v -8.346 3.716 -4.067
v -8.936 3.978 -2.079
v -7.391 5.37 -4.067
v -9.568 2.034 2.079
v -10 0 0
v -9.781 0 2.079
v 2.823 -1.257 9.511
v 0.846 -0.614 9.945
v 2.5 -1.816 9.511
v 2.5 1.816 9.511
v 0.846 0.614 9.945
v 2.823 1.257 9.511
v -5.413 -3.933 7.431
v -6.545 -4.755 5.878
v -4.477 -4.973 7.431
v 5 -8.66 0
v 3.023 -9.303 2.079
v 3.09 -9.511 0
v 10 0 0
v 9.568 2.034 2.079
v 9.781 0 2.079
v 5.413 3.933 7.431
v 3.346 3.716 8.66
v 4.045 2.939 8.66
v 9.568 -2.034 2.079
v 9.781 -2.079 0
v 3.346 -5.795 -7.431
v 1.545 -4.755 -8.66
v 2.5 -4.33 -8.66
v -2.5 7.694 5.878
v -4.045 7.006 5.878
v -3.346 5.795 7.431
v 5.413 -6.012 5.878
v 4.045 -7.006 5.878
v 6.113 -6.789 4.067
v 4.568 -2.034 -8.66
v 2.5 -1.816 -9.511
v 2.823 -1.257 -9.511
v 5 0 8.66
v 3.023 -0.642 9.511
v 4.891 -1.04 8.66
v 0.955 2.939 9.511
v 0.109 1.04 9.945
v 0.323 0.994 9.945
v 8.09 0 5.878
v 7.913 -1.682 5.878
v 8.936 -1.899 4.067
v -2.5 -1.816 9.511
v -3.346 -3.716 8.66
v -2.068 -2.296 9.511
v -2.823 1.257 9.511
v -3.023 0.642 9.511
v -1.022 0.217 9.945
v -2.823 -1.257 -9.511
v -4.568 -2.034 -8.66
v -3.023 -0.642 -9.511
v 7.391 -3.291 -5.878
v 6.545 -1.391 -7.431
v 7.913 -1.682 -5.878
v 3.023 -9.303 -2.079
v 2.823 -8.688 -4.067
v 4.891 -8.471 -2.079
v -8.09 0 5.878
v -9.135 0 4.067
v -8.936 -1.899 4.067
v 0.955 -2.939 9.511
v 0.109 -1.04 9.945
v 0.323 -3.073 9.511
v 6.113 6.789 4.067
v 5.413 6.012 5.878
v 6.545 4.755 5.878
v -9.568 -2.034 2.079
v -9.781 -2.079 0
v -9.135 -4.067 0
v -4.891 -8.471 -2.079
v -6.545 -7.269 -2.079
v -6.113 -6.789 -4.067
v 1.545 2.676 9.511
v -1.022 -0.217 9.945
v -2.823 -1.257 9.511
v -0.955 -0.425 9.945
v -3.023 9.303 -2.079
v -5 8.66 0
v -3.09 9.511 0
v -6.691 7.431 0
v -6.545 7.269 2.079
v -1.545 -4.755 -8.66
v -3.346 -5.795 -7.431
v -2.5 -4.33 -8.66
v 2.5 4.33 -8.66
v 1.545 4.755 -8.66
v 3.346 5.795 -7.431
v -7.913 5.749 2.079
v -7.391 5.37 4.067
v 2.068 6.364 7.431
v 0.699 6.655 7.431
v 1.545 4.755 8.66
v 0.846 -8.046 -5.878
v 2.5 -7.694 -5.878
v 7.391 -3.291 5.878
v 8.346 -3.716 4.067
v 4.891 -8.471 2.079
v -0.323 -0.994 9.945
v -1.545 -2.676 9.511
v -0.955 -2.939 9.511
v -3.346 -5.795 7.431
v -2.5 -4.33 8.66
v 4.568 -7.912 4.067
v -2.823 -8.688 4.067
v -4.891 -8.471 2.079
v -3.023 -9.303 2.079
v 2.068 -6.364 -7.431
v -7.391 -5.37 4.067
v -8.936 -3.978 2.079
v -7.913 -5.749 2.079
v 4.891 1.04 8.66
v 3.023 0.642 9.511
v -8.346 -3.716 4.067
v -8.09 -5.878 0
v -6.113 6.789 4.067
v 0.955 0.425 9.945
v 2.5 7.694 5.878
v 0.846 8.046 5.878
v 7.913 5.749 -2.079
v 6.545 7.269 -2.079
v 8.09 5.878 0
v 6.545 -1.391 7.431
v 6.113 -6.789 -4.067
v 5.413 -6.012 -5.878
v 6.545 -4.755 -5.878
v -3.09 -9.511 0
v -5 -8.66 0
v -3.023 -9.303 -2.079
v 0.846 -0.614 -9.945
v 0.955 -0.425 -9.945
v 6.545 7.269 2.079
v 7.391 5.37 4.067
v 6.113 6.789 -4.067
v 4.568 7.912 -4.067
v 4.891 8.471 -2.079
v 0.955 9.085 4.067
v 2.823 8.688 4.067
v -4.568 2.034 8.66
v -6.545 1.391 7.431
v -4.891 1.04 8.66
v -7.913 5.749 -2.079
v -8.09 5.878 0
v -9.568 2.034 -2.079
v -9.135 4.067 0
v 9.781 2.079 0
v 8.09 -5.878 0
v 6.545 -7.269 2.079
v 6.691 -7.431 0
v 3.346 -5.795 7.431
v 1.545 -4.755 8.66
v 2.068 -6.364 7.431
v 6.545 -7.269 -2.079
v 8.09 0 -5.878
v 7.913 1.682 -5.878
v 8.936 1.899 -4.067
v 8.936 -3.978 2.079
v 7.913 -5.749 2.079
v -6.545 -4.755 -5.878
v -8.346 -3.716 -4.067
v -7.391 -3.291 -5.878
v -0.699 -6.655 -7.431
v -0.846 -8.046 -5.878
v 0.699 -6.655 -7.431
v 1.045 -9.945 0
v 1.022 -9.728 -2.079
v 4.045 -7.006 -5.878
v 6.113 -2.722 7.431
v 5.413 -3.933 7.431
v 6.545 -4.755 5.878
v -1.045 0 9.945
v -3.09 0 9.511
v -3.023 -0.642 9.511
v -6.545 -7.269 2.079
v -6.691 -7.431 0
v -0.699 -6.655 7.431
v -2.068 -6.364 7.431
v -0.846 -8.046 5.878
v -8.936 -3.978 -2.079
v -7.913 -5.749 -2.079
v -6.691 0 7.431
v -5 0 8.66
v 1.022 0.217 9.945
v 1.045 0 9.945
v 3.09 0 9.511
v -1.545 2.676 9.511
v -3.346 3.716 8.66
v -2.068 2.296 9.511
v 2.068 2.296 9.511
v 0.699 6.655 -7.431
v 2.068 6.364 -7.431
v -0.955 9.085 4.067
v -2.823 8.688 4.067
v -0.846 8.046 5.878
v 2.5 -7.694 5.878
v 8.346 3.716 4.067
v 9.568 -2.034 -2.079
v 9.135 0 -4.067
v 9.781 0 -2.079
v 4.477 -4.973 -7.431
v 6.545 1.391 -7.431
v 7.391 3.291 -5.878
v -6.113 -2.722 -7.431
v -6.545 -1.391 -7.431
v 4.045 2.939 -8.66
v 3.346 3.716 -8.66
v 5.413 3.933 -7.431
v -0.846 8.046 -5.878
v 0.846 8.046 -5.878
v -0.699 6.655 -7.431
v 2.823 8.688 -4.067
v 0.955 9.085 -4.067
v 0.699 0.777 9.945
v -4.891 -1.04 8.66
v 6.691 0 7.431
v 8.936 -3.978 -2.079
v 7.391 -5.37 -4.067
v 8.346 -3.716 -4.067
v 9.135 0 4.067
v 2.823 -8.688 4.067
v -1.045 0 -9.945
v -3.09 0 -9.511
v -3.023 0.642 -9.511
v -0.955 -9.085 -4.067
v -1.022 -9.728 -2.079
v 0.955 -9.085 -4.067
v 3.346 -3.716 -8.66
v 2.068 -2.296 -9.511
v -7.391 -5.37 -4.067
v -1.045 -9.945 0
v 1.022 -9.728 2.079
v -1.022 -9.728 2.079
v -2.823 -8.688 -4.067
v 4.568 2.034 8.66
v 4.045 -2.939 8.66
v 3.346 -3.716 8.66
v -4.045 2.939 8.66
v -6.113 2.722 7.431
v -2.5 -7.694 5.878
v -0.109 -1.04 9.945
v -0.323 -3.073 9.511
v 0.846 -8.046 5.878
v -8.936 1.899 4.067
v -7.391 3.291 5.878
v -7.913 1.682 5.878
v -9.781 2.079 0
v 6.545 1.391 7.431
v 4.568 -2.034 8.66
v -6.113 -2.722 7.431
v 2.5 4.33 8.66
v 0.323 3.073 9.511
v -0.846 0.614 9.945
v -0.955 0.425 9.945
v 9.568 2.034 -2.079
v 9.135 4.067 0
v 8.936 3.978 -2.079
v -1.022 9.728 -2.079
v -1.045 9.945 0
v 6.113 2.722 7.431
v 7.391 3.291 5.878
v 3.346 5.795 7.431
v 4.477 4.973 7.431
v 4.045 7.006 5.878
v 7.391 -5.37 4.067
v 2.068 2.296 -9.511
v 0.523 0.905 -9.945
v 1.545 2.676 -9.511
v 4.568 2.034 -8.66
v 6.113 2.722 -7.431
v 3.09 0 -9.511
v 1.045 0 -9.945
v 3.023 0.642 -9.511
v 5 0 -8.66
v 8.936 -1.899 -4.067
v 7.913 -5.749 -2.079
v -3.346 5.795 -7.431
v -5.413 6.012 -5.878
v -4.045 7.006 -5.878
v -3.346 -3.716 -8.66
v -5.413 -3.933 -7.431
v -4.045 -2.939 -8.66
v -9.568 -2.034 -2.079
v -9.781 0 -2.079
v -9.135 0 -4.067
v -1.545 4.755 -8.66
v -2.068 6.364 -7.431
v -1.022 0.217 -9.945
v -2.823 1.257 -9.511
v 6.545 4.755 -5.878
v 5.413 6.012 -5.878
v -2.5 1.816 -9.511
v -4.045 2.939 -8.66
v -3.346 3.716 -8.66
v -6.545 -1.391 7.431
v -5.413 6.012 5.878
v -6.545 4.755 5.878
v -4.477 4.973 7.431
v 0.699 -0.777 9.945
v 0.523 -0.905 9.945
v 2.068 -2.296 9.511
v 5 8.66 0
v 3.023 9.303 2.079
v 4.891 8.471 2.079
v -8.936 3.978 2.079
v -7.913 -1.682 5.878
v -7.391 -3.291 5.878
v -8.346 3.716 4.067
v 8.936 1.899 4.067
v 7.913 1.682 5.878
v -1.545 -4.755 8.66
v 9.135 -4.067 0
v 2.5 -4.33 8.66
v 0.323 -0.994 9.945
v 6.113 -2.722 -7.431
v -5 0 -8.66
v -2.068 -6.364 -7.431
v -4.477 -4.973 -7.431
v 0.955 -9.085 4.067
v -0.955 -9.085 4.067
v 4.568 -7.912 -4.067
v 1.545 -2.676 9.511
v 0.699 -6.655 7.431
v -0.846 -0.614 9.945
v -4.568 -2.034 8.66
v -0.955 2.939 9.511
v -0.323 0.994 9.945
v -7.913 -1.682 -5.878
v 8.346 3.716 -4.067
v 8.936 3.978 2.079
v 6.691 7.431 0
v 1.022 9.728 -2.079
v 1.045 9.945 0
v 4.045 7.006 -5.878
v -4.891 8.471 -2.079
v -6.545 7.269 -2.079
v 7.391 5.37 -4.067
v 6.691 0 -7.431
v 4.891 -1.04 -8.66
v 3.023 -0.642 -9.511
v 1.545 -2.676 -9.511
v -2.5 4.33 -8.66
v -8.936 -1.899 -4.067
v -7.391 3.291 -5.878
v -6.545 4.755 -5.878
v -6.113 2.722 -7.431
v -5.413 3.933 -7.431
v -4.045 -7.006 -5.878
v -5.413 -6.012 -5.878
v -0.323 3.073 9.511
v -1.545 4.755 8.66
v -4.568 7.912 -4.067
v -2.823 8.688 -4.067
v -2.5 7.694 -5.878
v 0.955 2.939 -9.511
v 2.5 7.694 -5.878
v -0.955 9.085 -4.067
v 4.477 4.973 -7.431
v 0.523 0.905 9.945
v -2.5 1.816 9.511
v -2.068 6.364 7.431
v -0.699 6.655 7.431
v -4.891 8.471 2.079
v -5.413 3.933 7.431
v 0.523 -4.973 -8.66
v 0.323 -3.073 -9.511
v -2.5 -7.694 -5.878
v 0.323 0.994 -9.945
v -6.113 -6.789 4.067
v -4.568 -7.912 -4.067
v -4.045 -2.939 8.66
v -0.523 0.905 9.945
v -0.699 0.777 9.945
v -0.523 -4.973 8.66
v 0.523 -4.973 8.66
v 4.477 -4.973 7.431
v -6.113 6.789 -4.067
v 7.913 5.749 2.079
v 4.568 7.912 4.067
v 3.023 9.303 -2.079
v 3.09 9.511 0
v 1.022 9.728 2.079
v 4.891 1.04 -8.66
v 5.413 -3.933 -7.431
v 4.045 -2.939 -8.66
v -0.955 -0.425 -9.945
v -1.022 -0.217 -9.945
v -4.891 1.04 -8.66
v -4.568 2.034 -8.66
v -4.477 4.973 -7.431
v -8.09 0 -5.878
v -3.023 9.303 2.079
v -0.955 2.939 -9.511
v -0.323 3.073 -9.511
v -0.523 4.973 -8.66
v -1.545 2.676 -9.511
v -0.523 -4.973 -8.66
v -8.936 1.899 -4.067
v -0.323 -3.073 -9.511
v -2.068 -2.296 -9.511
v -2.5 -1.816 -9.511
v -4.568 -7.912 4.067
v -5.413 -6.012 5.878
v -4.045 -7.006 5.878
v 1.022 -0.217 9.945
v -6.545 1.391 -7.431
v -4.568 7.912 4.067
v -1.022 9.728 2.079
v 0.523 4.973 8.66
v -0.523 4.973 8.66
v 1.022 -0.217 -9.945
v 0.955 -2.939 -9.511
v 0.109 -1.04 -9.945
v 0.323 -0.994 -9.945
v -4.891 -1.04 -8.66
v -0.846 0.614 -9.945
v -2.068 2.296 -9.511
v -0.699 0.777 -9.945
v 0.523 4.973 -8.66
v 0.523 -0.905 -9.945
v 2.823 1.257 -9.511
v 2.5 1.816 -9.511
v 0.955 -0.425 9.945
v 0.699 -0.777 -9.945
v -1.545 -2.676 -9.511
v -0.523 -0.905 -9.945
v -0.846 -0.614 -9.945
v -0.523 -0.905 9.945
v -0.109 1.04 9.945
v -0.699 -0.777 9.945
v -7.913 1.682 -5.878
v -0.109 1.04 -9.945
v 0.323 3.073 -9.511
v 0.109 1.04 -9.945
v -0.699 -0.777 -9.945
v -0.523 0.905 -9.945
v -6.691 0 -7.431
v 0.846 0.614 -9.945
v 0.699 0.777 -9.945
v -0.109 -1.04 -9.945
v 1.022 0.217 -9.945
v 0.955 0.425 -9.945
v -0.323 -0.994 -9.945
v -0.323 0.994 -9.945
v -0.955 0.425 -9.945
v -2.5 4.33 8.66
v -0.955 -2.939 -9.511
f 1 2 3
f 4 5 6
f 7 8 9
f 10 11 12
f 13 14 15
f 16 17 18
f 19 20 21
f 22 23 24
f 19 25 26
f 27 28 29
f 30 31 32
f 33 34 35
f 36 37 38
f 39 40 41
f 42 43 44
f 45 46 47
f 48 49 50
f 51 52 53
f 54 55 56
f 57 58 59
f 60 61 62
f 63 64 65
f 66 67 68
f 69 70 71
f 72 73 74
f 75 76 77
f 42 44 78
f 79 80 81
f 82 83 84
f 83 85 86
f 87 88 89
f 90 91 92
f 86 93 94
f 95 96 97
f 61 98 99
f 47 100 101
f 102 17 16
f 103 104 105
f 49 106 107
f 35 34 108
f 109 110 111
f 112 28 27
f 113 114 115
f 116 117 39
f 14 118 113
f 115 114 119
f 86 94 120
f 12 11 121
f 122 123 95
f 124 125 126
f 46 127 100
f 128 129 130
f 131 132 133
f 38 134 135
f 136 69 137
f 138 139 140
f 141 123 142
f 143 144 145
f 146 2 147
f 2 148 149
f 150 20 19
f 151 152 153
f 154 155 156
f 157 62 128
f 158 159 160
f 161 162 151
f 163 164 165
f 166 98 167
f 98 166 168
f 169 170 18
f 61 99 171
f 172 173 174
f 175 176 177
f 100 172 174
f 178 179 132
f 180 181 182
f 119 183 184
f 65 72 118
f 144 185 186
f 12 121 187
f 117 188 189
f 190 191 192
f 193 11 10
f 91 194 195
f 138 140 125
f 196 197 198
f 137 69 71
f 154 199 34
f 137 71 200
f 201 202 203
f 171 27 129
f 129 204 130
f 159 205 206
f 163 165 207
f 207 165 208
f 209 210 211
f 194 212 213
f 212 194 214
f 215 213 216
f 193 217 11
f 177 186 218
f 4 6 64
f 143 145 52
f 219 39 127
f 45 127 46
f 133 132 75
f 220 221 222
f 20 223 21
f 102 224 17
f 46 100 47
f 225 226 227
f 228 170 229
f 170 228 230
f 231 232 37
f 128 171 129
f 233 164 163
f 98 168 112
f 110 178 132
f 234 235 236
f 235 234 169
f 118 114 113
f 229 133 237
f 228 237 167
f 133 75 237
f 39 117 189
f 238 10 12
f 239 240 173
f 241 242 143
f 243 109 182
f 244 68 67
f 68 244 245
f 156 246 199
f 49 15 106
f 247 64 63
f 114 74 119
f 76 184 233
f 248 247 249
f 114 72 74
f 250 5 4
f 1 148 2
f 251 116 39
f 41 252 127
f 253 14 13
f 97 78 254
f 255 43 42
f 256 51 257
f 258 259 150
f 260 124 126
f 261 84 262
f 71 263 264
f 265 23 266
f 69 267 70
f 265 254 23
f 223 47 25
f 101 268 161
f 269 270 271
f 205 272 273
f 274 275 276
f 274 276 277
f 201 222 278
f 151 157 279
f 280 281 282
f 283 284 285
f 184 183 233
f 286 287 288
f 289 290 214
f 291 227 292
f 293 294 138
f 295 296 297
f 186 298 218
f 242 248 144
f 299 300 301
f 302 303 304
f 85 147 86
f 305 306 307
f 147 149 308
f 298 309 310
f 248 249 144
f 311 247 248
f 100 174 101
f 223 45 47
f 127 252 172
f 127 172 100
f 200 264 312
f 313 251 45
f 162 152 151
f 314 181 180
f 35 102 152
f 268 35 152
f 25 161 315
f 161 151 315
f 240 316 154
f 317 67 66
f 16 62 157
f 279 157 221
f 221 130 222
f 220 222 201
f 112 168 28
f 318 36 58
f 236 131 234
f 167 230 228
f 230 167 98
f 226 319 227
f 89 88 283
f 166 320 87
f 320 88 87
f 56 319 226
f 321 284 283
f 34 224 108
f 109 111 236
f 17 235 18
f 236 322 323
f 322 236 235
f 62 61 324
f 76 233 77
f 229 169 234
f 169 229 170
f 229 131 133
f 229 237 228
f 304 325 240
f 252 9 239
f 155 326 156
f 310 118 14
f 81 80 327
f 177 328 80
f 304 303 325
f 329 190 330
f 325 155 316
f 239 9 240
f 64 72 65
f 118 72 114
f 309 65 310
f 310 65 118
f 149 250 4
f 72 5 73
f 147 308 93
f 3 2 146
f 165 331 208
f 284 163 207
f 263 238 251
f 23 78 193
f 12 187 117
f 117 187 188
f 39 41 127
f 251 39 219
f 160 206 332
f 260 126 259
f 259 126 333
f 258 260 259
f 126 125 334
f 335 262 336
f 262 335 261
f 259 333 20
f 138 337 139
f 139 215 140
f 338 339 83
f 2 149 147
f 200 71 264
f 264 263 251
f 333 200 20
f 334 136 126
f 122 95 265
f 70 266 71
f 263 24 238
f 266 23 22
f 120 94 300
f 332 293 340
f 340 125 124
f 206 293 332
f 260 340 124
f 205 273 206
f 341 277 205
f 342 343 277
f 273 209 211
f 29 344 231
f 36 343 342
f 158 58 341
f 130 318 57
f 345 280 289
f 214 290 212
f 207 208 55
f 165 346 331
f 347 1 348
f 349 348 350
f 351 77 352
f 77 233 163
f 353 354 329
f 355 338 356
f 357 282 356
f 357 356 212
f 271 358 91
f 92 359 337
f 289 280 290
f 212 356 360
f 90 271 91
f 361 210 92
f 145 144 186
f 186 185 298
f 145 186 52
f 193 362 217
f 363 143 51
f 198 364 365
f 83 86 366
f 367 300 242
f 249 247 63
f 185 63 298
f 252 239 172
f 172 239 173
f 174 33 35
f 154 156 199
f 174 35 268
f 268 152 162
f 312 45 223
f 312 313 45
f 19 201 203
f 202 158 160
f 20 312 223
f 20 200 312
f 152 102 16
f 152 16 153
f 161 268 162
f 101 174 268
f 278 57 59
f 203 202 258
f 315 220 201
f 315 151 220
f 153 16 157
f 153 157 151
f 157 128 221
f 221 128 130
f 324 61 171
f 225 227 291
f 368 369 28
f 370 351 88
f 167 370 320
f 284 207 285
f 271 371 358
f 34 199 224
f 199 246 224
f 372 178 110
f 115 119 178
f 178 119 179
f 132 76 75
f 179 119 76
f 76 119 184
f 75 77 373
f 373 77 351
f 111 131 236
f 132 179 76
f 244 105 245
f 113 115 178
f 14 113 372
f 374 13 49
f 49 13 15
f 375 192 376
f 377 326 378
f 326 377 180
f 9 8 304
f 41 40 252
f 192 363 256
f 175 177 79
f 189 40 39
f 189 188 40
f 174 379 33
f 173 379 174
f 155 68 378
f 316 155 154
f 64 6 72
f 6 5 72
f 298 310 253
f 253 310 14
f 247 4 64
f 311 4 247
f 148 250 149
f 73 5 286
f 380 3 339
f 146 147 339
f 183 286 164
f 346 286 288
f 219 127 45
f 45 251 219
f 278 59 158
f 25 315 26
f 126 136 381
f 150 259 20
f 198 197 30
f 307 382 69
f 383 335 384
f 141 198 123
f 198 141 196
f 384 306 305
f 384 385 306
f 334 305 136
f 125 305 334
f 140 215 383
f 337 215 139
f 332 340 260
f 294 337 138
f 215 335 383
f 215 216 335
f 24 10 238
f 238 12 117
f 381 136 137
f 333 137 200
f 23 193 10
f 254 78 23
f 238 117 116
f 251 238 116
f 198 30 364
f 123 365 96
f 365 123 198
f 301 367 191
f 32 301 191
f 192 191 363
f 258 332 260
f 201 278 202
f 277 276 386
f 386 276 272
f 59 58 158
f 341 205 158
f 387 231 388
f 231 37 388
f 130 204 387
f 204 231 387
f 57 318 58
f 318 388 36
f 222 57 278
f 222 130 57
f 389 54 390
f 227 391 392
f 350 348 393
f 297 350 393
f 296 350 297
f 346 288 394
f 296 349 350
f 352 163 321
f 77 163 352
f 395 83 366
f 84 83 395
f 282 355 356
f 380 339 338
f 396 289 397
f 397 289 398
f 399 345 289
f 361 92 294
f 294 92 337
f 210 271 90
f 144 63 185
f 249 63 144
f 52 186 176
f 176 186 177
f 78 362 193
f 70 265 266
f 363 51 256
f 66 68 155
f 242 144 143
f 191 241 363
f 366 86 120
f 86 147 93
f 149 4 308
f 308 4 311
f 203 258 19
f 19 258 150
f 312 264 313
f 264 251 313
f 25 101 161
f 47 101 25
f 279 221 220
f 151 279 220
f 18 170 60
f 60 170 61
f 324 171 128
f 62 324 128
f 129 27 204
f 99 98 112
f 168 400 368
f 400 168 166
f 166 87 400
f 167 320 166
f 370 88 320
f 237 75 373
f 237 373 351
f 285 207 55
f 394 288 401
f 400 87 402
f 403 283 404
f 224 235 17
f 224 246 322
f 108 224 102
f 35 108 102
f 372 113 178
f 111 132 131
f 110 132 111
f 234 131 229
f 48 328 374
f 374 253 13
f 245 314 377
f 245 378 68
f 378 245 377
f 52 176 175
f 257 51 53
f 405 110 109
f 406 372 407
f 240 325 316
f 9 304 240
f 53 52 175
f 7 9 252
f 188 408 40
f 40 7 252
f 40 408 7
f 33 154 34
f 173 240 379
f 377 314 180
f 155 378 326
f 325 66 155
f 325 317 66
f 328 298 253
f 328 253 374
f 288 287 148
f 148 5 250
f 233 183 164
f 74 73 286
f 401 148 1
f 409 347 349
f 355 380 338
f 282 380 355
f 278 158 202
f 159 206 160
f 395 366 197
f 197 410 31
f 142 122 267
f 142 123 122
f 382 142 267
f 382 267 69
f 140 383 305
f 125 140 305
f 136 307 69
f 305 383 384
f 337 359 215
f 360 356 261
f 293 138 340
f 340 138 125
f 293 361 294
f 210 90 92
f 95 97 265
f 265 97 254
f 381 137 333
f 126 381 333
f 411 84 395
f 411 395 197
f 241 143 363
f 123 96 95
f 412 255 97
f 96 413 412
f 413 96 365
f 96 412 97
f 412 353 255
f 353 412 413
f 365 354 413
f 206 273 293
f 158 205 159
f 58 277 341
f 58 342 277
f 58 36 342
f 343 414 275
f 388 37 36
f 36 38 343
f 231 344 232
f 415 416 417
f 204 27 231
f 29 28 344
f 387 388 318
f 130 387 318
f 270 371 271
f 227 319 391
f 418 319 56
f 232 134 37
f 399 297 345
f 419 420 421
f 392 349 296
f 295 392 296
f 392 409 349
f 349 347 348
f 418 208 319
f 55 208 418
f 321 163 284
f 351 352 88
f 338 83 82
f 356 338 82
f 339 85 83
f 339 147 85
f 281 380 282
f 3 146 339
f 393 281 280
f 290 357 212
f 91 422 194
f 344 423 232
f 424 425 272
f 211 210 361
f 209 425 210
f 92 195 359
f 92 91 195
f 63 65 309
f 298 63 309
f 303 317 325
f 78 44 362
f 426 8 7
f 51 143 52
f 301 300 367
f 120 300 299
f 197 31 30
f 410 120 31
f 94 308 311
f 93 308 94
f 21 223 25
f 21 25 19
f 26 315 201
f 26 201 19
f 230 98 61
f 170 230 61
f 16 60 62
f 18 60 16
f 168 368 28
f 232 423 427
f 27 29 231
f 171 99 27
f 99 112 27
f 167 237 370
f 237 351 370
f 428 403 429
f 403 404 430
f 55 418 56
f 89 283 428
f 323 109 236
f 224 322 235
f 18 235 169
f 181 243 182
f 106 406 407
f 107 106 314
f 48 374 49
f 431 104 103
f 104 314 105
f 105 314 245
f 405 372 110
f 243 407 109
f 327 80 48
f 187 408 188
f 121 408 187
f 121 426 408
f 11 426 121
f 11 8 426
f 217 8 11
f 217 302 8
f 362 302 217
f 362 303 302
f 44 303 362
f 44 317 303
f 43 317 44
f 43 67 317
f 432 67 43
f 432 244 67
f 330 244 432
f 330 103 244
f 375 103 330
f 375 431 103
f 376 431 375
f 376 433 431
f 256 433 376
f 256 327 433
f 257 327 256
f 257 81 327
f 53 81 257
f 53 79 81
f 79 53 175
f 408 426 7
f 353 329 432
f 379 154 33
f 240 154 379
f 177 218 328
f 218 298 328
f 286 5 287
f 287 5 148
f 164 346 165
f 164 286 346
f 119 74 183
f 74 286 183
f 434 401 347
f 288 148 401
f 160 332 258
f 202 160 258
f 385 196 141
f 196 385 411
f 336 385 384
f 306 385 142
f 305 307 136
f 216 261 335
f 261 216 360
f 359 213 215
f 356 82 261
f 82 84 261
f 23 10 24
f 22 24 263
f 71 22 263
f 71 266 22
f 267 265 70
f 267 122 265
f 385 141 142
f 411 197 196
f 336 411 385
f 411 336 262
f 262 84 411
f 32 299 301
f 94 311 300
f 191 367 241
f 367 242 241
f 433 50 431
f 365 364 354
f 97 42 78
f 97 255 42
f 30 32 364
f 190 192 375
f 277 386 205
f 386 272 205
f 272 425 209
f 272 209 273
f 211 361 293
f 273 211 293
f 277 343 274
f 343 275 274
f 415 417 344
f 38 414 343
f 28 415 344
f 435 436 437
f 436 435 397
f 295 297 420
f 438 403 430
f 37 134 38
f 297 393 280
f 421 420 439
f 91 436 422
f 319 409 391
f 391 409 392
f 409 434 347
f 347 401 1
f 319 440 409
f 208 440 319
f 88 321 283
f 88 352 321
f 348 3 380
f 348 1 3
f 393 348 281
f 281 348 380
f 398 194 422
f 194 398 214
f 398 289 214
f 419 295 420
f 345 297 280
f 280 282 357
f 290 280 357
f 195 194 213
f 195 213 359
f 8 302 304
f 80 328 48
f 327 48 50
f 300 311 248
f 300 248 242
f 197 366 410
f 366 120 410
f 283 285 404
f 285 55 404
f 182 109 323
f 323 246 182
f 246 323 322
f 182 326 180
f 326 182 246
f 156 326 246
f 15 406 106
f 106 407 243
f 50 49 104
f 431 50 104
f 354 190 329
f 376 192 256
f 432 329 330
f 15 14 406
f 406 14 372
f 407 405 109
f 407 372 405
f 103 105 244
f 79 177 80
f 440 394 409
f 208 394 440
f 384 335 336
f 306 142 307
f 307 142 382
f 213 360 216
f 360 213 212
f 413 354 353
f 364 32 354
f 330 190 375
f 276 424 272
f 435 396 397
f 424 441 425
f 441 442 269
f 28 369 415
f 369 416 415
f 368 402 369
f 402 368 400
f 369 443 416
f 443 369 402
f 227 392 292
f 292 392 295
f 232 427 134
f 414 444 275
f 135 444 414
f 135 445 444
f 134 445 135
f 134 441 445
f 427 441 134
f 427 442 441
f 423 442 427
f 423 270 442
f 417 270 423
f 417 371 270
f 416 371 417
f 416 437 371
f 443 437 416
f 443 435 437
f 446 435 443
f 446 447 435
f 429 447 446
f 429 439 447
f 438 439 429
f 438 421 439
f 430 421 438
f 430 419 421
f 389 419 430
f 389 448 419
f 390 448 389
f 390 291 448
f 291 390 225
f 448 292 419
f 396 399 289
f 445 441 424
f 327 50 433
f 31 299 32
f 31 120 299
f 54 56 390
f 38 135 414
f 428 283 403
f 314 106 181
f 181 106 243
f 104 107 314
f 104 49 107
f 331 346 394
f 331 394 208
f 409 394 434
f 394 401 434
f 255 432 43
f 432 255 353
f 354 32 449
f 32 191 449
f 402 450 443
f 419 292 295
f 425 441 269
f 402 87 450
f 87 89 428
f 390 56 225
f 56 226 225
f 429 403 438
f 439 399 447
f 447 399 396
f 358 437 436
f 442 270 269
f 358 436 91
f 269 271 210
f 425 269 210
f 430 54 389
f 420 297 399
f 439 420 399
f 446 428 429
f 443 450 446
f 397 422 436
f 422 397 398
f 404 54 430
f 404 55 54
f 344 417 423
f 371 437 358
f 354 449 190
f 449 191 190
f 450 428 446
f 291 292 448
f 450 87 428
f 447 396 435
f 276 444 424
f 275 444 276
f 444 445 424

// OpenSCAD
sphere(r = 1);
sphere(r = 5);
sphere(r = 10);
sphere(d = 2);
sphere(d = 10);
sphere(d = 20);
